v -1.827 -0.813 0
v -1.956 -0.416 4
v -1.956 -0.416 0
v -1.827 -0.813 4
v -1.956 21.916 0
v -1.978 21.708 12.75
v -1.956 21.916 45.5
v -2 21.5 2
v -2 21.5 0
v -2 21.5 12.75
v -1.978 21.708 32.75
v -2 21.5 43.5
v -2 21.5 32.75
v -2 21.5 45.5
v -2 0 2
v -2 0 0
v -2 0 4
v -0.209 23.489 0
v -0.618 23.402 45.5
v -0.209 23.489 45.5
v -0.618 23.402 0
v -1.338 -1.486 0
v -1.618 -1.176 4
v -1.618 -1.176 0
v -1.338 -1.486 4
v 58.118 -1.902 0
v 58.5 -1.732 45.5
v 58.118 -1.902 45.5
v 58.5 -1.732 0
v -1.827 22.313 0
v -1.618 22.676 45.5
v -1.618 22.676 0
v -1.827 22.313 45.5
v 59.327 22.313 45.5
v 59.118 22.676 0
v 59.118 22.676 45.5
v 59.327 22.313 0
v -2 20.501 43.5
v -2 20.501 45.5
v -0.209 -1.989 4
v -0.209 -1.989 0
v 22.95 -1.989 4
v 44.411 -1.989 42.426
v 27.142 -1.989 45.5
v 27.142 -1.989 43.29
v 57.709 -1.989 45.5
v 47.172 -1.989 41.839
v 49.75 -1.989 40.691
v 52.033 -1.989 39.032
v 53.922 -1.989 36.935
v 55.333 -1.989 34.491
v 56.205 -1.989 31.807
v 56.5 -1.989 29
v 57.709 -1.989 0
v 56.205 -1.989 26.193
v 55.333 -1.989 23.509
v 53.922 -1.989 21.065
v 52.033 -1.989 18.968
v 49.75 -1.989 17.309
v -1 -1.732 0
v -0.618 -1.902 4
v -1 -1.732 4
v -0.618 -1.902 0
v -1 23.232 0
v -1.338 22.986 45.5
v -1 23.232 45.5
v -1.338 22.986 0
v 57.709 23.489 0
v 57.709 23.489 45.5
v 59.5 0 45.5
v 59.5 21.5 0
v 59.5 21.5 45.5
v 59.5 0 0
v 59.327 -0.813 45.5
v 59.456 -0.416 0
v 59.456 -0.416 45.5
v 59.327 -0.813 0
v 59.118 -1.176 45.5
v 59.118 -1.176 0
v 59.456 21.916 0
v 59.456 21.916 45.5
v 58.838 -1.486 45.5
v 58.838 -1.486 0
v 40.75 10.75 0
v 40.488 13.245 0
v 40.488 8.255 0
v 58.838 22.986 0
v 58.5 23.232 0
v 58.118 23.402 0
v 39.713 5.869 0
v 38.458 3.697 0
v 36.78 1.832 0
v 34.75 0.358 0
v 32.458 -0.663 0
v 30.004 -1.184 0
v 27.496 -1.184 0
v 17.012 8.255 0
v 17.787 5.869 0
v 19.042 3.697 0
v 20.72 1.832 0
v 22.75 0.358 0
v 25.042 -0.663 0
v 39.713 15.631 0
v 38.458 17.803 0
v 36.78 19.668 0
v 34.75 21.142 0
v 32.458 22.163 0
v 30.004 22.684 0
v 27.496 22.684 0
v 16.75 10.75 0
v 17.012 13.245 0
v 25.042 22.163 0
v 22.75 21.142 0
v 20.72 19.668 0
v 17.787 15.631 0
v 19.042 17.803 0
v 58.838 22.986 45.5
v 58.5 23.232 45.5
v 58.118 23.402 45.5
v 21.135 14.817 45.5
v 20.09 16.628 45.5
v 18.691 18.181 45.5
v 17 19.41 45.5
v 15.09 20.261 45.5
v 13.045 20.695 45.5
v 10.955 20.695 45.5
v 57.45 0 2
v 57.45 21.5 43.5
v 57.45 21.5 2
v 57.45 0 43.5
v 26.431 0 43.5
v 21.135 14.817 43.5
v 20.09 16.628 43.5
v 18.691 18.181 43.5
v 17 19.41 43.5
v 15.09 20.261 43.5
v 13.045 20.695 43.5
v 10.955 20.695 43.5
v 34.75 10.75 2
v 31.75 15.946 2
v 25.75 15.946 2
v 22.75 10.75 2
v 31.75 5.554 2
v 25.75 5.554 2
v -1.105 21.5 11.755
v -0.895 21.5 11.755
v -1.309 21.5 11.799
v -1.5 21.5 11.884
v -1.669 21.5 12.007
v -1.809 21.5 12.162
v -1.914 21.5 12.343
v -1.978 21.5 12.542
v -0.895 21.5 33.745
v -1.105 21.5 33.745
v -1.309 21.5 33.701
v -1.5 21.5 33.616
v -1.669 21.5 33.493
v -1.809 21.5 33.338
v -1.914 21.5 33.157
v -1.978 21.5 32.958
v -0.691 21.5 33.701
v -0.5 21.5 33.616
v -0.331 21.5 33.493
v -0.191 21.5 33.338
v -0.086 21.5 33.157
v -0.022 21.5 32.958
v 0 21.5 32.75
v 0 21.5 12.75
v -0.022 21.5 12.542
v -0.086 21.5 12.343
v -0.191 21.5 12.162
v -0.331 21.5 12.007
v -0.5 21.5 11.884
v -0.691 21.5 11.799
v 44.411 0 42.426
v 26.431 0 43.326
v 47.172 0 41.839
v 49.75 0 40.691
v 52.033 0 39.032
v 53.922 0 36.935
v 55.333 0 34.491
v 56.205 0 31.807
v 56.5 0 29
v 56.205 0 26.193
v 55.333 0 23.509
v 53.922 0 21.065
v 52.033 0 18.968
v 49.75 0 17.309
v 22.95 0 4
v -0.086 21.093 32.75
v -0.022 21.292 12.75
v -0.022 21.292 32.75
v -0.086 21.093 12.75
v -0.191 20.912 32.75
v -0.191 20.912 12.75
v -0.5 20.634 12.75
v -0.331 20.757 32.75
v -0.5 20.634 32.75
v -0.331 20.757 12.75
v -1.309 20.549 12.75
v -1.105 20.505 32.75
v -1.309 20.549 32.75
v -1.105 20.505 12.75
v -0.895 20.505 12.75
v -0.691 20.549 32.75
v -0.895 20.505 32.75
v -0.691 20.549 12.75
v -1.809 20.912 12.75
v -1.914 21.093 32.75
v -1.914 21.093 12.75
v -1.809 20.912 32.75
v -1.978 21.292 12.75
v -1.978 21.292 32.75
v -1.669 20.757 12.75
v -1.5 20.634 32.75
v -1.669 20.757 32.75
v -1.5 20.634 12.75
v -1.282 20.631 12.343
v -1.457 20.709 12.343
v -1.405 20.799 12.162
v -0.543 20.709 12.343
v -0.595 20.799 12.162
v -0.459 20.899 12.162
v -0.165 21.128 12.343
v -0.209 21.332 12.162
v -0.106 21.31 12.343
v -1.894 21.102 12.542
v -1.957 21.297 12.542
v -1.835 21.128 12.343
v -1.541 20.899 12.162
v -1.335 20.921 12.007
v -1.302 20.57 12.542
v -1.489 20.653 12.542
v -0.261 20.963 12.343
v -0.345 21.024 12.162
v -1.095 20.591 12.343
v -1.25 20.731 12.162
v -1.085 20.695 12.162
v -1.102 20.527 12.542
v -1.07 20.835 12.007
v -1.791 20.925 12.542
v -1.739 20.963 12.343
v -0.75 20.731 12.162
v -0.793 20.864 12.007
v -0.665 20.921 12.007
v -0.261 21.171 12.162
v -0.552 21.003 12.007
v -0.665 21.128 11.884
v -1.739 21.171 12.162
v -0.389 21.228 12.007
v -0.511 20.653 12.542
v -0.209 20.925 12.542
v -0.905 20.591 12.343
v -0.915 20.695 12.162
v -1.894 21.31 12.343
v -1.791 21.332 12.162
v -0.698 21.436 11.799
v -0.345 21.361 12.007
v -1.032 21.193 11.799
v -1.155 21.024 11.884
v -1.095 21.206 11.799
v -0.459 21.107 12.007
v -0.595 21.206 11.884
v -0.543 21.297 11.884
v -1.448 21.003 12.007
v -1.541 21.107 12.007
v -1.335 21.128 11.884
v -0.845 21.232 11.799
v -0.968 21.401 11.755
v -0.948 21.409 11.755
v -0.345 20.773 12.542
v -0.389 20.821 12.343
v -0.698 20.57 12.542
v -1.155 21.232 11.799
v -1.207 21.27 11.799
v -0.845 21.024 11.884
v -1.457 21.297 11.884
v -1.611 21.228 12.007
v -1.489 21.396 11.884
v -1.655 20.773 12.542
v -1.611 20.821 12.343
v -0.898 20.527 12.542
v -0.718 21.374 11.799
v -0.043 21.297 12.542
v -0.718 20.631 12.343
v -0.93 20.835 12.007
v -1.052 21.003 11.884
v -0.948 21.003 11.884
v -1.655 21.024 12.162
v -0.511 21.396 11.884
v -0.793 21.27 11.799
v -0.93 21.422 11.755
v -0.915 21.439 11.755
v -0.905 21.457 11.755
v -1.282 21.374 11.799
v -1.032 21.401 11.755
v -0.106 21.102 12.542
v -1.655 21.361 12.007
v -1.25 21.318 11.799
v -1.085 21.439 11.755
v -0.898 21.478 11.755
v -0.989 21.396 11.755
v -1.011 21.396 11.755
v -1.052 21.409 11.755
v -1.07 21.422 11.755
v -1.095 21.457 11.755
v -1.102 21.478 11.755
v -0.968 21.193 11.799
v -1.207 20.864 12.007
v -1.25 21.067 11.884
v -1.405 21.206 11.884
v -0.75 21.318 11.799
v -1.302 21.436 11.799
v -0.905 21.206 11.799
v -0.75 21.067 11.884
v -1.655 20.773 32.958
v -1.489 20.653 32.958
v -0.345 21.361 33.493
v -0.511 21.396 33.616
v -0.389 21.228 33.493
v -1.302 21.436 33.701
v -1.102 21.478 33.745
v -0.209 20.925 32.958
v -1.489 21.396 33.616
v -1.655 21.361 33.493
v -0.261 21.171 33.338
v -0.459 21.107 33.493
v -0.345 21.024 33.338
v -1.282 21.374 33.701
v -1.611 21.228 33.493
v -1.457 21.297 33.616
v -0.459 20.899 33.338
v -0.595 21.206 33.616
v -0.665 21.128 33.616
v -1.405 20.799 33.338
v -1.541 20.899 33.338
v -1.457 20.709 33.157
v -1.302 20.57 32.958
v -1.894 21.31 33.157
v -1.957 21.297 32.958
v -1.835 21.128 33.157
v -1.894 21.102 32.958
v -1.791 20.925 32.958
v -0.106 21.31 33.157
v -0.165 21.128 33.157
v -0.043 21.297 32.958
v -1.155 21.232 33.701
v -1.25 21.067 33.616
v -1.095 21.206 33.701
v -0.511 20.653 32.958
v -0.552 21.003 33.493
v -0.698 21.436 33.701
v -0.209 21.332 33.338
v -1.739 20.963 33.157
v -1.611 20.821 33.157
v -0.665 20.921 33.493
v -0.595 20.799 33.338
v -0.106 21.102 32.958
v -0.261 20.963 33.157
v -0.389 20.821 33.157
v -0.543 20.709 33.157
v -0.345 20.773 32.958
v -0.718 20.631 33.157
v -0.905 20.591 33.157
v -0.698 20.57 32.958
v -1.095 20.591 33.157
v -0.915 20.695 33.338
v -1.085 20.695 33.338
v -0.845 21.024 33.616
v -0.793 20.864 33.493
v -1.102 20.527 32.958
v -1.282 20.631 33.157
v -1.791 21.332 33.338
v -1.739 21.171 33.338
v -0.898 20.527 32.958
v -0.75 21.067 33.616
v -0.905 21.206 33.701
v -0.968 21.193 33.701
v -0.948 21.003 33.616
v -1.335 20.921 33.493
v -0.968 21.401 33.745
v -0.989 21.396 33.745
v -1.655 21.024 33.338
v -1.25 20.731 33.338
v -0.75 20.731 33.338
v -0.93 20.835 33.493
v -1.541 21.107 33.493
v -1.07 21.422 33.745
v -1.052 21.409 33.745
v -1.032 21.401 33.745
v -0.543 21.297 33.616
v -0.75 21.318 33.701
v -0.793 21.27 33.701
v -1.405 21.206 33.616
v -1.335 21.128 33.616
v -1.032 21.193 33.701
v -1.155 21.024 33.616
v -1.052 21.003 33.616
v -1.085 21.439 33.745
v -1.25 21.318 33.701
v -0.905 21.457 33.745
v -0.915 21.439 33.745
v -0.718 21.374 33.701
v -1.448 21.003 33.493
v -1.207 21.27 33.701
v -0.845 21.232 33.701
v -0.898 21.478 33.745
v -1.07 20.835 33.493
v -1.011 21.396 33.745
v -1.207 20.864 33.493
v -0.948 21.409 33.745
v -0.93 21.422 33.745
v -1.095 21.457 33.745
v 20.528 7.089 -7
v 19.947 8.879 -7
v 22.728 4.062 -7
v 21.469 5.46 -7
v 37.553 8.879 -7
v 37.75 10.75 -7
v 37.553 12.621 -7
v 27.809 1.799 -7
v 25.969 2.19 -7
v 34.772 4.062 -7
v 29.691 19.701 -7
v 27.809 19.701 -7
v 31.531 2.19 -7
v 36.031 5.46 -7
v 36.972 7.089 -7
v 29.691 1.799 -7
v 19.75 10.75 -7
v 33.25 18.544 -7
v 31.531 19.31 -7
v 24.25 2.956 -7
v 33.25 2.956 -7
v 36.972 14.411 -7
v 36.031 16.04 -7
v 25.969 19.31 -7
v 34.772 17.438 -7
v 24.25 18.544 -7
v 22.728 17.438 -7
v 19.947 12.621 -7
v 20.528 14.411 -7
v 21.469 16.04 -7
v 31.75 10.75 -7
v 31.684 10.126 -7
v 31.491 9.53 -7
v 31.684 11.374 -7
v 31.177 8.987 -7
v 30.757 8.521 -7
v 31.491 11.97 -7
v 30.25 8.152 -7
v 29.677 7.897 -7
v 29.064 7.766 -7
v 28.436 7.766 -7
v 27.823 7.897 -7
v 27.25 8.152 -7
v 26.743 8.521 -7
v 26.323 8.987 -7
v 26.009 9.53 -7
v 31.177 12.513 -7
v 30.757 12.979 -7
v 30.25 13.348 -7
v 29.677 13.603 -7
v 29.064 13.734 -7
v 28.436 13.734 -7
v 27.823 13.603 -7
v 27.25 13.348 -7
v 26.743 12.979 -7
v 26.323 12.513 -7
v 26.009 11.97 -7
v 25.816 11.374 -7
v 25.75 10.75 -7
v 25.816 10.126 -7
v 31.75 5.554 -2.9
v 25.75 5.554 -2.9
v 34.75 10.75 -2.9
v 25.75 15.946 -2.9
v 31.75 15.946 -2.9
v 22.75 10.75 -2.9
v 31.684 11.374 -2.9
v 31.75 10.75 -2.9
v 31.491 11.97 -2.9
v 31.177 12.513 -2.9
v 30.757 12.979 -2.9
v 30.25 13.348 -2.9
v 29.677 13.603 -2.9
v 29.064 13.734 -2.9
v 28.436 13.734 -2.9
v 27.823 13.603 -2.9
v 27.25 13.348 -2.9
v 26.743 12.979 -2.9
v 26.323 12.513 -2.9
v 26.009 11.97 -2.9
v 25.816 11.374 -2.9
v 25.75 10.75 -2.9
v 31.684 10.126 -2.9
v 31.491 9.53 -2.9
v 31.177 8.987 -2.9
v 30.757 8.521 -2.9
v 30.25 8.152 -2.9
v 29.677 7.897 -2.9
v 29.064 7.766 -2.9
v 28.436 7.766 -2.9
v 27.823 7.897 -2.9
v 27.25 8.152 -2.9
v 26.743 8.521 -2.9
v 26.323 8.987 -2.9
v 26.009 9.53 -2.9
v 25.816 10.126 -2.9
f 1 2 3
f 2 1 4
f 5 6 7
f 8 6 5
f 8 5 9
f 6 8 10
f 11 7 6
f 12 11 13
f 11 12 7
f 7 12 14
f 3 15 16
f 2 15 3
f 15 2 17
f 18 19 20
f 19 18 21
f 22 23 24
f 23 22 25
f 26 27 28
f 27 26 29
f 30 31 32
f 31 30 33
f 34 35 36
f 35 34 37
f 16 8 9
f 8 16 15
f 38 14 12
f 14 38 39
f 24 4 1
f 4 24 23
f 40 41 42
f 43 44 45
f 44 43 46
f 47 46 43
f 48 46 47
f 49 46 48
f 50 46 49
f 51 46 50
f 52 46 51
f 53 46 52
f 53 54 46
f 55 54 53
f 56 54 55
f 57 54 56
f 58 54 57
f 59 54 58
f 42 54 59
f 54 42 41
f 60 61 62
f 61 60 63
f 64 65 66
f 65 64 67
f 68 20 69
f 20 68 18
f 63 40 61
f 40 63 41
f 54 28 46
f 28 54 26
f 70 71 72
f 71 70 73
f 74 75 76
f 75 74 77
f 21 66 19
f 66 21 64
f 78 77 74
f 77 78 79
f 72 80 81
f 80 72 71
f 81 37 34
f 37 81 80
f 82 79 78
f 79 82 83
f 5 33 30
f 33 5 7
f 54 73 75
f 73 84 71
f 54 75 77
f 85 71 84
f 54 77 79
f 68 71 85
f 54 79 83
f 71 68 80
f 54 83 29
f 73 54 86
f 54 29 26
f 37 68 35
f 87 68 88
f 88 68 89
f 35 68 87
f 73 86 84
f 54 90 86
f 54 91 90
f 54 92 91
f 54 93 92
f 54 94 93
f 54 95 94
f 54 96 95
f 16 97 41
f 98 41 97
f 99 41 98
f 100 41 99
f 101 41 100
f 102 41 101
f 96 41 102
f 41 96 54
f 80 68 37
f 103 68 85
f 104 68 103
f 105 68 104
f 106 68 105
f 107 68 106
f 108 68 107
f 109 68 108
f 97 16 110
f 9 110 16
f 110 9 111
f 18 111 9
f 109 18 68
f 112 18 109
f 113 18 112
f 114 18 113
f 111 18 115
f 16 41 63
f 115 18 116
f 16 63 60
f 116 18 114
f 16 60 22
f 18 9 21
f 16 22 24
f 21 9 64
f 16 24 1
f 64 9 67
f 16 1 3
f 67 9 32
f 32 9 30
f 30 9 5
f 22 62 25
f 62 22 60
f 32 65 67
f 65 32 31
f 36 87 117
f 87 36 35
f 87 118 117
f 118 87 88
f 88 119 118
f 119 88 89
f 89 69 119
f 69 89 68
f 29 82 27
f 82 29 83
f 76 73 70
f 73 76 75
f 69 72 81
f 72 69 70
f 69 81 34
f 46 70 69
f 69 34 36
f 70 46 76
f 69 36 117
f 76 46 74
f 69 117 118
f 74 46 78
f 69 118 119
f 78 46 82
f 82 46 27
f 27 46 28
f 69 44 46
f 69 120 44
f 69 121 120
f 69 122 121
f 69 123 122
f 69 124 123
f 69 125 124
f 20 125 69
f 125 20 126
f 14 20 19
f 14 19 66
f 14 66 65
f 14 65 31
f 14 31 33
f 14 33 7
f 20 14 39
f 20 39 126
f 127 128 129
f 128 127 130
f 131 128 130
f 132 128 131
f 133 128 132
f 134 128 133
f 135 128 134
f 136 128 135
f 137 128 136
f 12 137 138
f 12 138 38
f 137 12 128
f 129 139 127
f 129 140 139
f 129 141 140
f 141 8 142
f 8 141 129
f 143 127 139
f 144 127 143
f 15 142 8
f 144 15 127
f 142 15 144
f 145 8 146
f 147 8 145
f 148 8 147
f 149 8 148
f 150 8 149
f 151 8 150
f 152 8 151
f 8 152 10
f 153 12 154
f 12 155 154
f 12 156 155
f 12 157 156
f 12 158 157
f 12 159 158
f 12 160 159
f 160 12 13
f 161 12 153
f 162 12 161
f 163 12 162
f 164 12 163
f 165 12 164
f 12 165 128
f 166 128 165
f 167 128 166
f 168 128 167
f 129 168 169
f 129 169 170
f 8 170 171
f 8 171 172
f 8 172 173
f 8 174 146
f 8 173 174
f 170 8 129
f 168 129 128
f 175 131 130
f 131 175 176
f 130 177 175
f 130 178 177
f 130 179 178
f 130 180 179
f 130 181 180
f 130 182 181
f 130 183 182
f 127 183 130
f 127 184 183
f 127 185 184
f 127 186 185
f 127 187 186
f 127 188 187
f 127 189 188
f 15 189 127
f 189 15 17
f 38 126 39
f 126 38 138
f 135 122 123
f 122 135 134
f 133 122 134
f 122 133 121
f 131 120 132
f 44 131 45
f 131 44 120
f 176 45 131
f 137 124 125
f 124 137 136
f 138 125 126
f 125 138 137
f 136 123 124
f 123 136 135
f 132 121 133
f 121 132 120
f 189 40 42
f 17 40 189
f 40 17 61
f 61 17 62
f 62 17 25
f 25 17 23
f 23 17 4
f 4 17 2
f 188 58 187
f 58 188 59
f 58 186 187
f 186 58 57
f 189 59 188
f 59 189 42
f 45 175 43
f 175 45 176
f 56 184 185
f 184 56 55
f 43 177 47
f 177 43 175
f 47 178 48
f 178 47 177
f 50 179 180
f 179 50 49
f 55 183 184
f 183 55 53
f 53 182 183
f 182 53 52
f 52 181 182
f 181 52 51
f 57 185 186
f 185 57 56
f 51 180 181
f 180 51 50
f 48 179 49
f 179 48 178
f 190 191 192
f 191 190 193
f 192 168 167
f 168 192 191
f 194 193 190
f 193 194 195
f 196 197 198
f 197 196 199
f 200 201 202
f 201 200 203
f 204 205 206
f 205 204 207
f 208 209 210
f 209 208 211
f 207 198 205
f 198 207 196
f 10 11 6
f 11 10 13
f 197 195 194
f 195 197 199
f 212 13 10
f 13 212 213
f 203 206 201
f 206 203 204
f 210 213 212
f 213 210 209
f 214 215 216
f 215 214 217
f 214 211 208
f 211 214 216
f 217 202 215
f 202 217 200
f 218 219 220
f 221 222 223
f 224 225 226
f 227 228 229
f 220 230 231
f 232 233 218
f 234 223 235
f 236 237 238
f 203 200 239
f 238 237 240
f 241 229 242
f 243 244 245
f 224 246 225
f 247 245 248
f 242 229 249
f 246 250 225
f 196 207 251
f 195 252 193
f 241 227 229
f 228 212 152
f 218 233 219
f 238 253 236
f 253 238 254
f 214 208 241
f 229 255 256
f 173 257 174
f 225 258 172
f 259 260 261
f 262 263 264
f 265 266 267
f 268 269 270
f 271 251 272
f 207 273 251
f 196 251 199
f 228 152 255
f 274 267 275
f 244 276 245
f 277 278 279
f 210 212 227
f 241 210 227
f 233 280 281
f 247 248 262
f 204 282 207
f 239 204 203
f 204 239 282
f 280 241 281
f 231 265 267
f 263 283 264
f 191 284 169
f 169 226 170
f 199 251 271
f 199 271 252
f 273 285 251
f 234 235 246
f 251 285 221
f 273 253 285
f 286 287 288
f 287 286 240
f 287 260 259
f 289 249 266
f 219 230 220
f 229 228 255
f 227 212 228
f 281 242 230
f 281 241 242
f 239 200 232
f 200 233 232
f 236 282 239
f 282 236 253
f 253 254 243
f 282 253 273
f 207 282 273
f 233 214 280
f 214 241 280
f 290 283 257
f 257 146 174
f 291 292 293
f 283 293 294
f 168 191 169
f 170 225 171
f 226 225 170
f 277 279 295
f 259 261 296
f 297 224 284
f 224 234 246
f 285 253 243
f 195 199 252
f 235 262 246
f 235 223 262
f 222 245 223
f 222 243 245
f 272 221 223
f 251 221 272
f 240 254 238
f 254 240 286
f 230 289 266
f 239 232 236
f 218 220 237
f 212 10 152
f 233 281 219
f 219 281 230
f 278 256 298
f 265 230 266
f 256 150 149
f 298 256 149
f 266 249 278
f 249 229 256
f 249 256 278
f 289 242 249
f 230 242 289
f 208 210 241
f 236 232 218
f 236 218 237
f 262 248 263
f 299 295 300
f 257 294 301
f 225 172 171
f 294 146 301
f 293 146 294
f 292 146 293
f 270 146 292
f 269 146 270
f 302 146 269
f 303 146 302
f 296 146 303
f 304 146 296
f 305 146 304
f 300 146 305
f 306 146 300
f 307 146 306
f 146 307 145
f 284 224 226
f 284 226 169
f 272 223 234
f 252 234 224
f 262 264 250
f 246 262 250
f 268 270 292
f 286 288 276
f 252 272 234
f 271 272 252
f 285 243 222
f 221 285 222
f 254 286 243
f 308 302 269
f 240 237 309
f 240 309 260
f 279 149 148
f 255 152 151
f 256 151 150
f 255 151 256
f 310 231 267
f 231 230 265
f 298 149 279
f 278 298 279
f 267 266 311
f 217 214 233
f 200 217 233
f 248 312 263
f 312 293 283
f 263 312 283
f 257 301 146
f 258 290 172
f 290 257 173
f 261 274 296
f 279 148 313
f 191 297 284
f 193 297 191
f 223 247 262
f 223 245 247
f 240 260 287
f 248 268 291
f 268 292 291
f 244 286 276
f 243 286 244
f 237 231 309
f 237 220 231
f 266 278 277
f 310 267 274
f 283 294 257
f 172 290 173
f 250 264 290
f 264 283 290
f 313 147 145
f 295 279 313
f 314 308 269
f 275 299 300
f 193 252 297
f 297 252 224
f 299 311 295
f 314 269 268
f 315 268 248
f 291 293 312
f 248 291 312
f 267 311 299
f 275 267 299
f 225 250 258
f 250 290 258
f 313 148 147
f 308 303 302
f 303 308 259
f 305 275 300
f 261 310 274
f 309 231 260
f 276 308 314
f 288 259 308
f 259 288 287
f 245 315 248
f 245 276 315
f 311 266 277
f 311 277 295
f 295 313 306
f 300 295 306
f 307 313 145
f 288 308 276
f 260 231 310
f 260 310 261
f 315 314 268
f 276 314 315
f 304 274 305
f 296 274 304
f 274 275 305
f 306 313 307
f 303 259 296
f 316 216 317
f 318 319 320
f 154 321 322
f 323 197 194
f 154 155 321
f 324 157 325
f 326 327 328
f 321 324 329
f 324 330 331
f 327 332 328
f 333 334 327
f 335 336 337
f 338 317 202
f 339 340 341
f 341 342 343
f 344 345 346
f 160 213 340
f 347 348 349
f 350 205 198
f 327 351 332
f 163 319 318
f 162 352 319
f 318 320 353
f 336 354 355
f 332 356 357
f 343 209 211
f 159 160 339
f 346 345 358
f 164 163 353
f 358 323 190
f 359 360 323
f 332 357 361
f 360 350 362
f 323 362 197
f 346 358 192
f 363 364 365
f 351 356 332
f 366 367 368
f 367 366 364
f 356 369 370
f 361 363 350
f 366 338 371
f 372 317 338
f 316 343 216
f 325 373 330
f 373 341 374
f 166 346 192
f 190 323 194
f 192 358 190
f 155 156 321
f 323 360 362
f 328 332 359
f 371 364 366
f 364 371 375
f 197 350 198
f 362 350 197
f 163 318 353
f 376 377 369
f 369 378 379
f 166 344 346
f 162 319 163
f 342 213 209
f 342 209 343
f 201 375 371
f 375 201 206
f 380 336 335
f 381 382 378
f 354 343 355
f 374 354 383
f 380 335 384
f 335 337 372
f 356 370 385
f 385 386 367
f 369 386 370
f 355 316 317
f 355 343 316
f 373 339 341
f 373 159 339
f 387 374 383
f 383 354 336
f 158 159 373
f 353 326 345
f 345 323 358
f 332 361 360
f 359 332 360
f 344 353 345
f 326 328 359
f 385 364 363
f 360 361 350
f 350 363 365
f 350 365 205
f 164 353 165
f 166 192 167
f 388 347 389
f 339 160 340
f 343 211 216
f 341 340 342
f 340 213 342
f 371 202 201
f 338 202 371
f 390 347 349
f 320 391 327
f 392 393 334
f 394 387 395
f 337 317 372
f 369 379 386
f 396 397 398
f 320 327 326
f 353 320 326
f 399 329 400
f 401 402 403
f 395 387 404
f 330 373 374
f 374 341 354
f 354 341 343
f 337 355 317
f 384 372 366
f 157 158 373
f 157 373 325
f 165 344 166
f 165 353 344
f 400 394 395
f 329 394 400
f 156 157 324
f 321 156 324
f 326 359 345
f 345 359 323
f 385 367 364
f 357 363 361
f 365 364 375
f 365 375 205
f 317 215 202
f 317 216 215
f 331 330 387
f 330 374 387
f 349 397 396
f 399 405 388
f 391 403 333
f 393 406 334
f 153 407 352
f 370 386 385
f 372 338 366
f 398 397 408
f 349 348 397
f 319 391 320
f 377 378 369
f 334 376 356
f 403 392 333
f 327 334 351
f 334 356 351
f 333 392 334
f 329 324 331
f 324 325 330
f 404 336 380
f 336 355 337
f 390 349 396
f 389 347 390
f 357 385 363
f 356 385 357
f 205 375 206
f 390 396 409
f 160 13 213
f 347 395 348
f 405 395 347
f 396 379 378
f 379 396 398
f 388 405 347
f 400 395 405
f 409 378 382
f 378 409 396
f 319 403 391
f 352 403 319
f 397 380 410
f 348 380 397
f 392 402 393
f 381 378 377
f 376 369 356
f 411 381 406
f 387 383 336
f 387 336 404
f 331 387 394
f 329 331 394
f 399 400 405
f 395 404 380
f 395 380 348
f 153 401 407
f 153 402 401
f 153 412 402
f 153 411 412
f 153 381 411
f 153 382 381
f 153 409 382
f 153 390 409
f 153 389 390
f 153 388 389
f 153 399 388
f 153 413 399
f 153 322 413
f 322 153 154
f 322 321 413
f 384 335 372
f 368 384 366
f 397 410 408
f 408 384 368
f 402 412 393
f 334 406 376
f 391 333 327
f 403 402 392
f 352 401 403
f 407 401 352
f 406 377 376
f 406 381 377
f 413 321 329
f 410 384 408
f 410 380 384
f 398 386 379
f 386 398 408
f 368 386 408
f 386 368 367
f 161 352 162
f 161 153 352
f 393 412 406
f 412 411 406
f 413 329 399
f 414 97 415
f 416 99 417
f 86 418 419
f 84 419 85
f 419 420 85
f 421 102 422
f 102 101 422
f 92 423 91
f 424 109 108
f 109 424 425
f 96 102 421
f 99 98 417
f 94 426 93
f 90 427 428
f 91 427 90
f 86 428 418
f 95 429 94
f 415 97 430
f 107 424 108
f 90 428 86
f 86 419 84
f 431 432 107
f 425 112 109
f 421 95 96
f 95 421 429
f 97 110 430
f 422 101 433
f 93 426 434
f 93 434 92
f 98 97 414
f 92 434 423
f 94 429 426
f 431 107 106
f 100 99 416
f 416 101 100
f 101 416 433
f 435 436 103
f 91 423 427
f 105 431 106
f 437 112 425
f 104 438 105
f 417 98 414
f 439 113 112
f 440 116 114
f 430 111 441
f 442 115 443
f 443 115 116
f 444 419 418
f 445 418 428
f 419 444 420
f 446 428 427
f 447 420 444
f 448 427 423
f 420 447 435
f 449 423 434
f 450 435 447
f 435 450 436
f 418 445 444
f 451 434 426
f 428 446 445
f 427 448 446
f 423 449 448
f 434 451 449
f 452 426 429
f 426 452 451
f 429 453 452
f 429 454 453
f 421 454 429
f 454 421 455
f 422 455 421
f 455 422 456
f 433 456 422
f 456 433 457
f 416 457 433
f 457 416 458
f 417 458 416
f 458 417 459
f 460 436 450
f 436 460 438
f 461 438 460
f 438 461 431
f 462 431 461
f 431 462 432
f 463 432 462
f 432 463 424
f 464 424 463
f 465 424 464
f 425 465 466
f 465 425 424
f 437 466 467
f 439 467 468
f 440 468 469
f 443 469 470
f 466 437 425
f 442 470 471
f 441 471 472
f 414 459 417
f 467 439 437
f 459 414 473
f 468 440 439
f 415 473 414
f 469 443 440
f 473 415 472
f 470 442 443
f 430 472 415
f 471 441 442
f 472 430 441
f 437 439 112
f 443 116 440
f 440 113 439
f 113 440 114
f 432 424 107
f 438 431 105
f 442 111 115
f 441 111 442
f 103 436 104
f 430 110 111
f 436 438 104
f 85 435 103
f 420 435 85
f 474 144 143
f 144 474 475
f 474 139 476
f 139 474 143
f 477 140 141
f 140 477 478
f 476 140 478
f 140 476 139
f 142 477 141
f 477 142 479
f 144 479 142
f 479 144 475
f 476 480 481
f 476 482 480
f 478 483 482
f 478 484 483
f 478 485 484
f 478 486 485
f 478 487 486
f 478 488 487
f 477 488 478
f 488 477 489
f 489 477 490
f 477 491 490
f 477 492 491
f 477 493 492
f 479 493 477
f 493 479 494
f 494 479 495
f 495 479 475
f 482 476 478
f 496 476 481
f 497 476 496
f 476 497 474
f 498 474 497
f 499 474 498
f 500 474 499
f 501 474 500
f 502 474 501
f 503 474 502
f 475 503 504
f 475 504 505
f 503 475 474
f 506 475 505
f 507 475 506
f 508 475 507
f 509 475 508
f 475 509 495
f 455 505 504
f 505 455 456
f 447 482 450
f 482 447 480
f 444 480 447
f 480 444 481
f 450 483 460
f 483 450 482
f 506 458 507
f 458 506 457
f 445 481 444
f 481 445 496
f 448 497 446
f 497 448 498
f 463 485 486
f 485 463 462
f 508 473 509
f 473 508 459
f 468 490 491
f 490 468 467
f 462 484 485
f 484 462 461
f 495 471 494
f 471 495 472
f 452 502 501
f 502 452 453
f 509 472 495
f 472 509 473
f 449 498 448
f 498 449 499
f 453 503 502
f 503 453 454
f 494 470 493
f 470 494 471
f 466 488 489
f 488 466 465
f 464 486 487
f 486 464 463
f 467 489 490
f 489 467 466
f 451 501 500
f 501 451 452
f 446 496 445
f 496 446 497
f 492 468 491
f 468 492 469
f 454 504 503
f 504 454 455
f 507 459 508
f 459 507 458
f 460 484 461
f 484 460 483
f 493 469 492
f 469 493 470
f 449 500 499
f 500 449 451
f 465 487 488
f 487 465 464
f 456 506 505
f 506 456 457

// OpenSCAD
WALL_T = 2;
TOL=.5;
$fn=30;

void_w = 57+TOL;
void_h = 41+TOL;
void_l = 21+TOL;

bottom = [[0,0],[void_w, 0], [void_w, void_l], [0, void_l]];
difference(){
    union(){
        difference(){
            linear_extrude(void_h+ 2*WALL_T){
                hull() {
                    for(i=bottom){
                        translate(i) circle(WALL_T);
                    }
                }
            }

            translate([-WALL_T-.05,0,WALL_T]) cube([void_w+WALL_T, void_l, void_h]);

            //top
            hull(){
                translate([12, void_l/2, void_h]) cylinder(d=20, h=10);
                translate([-WALL_T-.05, 0, void_h]) cube([5, void_l-1, 10]);
                translate([-WALL_T-.05, -15, void_h]) cube ([30,void_l/2,10]);

            }
            //front
            hull(){
                translate([43, 1, 27+ WALL_T]) rotate([90,0,0]) cylinder(d=27, h=10);
                height=2;
                translate([-WALL_T-.05, -WALL_T-.05, WALL_T+height]) cube([25, 10, void_h-height]);
            }
        }
        //translate([-WALL_T, void_l, void_h/2 + WALL_T - 10]) linear_extrude(20) polygon([[0,0], [2, 0], [0, -1]]);
        translate([-WALL_T/2, void_l, void_h/2 + WALL_T - 10]) {
            cylinder(d=2, h=20);
            sphere(d=2);
            translate([0,0,20]) sphere(d=2);
        }
        
        translate([void_w/2, void_l/2, -7]) cylinder(d1=18, d2=24, h=7);
    }

    translate([void_w/2, void_l/2, WALL_T-4.9]) union(){
        cylinder($fn=6, d=12, h=5);
        translate([0,0,-9.9])cylinder(d=6, h=10);
    }
    
}
